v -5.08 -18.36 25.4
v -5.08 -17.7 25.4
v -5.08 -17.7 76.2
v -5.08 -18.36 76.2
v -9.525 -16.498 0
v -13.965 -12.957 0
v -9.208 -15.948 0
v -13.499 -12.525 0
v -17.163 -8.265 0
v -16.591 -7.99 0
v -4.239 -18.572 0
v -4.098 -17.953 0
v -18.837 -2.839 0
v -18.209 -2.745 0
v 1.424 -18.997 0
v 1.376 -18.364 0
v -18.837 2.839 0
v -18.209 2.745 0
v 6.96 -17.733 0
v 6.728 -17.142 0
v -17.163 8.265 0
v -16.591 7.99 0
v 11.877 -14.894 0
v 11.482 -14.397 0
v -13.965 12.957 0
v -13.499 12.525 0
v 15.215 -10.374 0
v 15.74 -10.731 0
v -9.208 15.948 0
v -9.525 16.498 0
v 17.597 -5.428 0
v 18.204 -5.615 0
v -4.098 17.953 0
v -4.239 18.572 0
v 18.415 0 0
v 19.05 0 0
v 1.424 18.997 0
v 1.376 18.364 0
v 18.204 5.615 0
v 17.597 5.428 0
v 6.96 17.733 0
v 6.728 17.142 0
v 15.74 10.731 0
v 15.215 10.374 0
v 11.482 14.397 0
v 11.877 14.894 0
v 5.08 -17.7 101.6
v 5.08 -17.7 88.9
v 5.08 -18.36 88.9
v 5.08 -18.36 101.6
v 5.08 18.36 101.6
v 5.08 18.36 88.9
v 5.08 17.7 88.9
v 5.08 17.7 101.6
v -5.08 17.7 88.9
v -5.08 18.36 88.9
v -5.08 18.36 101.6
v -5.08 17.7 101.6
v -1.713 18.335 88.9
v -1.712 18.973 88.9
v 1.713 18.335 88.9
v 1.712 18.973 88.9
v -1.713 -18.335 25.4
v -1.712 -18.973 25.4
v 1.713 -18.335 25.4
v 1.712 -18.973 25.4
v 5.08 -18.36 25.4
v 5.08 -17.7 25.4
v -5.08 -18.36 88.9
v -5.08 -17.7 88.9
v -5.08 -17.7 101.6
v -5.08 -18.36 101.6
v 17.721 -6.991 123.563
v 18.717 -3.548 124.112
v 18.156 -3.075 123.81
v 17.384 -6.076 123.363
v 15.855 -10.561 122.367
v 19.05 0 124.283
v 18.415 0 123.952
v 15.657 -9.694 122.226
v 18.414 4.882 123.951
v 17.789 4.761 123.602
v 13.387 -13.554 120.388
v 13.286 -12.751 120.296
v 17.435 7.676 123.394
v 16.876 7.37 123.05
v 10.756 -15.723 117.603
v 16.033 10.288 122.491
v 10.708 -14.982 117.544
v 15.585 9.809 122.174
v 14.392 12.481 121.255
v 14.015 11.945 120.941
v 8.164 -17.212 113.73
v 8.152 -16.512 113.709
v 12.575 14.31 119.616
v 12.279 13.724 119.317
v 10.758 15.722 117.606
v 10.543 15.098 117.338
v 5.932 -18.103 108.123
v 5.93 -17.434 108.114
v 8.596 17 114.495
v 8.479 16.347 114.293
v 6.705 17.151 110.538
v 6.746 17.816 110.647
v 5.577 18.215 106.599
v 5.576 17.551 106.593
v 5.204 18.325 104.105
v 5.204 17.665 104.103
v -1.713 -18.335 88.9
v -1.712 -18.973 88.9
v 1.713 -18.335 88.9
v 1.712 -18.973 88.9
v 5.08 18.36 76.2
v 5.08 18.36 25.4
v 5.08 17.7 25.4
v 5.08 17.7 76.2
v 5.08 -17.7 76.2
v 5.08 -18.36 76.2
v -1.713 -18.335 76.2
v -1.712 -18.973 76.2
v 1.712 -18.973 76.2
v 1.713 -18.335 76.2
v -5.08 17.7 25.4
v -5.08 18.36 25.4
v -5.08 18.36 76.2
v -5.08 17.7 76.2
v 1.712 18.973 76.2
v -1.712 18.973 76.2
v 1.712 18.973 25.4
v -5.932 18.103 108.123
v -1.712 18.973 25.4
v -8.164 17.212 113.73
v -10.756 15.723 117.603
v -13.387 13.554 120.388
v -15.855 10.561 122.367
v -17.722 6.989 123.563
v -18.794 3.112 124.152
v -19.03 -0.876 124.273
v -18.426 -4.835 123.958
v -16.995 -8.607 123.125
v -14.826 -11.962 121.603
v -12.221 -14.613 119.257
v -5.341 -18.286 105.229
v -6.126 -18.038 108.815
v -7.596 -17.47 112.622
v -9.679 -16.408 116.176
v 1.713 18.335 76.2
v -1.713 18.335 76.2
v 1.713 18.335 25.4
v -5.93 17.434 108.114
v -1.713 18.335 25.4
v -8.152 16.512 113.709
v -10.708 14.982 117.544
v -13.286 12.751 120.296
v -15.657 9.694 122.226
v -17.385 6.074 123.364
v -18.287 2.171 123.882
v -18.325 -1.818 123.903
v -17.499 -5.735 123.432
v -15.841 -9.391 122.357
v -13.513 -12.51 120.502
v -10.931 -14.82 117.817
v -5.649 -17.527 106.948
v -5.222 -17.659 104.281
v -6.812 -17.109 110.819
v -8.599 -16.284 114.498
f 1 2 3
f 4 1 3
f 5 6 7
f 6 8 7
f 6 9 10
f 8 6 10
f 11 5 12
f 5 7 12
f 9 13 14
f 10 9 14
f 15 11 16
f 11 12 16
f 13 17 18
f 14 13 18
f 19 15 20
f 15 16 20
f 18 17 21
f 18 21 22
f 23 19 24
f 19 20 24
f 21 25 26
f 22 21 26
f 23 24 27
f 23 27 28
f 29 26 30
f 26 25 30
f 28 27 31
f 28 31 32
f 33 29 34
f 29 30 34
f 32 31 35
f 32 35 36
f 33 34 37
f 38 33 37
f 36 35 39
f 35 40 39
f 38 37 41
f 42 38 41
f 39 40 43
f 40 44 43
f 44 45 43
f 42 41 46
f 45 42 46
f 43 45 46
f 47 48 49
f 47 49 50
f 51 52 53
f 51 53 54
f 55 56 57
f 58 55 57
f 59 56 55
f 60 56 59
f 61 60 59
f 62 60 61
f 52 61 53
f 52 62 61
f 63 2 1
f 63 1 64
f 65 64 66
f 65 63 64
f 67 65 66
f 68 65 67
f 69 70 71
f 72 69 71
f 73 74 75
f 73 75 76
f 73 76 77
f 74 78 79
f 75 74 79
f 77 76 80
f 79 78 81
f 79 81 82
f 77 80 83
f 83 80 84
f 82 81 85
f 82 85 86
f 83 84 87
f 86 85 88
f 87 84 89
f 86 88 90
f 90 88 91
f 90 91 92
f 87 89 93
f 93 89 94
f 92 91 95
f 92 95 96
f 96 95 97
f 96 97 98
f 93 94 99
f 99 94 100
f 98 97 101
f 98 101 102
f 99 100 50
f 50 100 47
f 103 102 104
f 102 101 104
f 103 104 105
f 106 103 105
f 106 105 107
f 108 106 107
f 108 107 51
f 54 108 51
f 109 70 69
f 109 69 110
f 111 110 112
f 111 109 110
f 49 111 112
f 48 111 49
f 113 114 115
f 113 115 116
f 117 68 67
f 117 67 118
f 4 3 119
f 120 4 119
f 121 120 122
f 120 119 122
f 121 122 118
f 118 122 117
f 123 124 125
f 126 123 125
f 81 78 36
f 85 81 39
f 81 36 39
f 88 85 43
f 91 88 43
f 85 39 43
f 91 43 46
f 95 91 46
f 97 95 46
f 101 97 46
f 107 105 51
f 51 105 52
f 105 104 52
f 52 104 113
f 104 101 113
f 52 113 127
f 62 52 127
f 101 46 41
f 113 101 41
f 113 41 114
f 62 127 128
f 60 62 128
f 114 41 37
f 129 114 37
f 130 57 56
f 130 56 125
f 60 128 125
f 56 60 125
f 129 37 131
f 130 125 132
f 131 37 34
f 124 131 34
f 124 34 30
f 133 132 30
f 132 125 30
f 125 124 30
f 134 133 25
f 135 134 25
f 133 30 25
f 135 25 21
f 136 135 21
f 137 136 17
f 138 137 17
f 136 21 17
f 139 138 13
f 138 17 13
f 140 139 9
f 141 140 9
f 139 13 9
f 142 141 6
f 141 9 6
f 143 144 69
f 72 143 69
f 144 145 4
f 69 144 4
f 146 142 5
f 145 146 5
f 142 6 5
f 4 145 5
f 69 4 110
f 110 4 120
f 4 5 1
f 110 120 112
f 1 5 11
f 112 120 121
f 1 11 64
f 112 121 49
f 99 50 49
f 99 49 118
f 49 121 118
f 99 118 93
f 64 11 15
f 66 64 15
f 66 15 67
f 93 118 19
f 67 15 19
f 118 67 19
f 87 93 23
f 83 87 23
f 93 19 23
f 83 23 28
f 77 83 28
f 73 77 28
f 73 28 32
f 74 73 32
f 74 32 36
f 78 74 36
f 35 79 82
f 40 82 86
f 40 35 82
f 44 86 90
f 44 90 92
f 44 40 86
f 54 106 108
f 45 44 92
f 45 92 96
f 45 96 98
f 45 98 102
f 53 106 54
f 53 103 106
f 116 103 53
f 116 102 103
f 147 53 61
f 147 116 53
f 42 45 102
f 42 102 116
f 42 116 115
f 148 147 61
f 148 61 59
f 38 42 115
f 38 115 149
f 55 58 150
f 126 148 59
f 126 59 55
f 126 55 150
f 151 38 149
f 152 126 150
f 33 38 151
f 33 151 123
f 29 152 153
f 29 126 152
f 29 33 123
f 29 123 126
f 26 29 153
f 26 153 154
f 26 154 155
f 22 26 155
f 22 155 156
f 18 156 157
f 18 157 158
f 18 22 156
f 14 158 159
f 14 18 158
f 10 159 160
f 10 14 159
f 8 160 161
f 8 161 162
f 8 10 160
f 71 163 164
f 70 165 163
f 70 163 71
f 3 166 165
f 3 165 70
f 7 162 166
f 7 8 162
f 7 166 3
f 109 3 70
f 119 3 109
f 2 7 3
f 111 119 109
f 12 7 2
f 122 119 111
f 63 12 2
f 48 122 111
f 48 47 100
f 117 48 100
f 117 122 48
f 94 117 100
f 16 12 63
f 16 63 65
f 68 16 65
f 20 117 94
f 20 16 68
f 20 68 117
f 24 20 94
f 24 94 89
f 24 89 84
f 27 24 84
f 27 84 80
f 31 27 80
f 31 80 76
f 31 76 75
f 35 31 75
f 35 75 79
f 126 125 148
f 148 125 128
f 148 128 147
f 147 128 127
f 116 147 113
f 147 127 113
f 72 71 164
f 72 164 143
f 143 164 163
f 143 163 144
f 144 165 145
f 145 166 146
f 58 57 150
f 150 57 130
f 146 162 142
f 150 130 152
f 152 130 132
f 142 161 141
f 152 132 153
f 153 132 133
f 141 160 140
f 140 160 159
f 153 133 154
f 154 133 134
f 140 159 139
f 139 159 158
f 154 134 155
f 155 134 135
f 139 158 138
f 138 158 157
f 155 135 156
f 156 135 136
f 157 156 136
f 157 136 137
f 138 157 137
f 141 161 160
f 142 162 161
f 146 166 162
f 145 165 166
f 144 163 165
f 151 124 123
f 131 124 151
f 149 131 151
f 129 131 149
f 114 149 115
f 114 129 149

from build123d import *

# Parameters (mm, degrees)
F0_R        = 19.05
F1_DEPTH    = 127
F2_T        = -0.635
F3_W        = 10.16
F3_H        = 50.8
F3_H_2      = 127
F4_DEPTH    = 38.1
F5_T1_DEPTH = 127.6597299865
F5_T3_DEPTH = 127.6597299858
F5_T5_DEPTH = 127.6597299858
F5_T7_DEPTH = 127.6597299865


# Not quite as in the source:
# - a fillet or chamfer that OpenCascade refuses, or shapes differently, is made with other operations: its cross-section is extruded or revolved along the edge and cut away or added


with BuildPart() as f1:
    # F0 (on Top) → F1 (new body)
    with BuildSketch(Plane.XY):
        Circle(F0_R)
    extrude(amount=F1_DEPTH)

    # F2
    f2_openings = [f1.faces().sort_by_distance(p)[0] for p in [
        (0, 0, 0),
        (0, 0, 127),
    ]]
    offset(amount=F2_T, openings=f2_openings)

    # F3 (on Front) → F4 (cut, symmetric)
    with BuildSketch(Plane.XZ):
        with Locations((0, 50.8)):
            Rectangle(F3_W, F3_H)
        with Locations((-3.17e-08, 114.3)):
            Rectangle(F3_W, F3_H)
        with Locations((-0.4444076066, 213.36)):
            Rectangle(F3_W, F3_H_2)
    extrude(amount=F4_DEPTH, both=True, mode=Mode.SUBTRACT)

    # F5: fillet of radius 25.4 on 4 edges, made by hand

    # F5_s2 → F5_t1 (cut)
    with BuildSketch(Plane.XZ.offset(-45.7995529809)):
        with BuildLine():
            ThreePointArc((-5.0800000317, 101.6), (-12.5194877896, 119.5605122421), (-30.4800000317, 127))
            Line((-30.4800000317, 127), (-5.0800000317, 127))
            Line((-5.0800000317, 127), (-5.0800000317, 101.6))
        make_face()
    extrude(amount=F5_T1_DEPTH, mode=Mode.SUBTRACT)

    # F5_s4 → F5_t3 (cut)
    with BuildSketch(Plane.XZ.offset(-45.7995529626)):
        with BuildLine():
            ThreePointArc((30.4799999683, 127), (12.5194877261, 119.5605122421), (5.0799999683, 101.6))
            Line((5.0799999683, 101.6), (5.0799999683, 127))
            Line((5.0799999683, 127), (30.4799999683, 127))
        make_face()
    extrude(amount=F5_T3_DEPTH, mode=Mode.SUBTRACT)

    # F5_s6 → F5_t5 (cut)
    with BuildSketch(Plane.XZ.offset(-81.8601770232)):
        with BuildLine():
            ThreePointArc((30.4799999683, 127), (12.5194877261, 119.5605122421), (5.0799999683, 101.6))
            Line((5.0799999683, 101.6), (5.0799999683, 127))
            Line((5.0799999683, 127), (30.4799999683, 127))
        make_face()
    extrude(amount=F5_T5_DEPTH, mode=Mode.SUBTRACT)

    # F5_s8 → F5_t7 (cut)
    with BuildSketch(Plane.XZ.offset(-81.8601770056)):
        with BuildLine():
            ThreePointArc((-30.4800000317, 127), (-12.5194877896, 119.5605122421), (-5.0800000317, 101.6))
            Line((-5.0800000317, 101.6), (-5.0800000317, 127))
            Line((-5.0800000317, 127), (-30.4800000317, 127))
        make_face()
    extrude(amount=F5_T7_DEPTH, mode=Mode.SUBTRACT)


solid = f1.part
